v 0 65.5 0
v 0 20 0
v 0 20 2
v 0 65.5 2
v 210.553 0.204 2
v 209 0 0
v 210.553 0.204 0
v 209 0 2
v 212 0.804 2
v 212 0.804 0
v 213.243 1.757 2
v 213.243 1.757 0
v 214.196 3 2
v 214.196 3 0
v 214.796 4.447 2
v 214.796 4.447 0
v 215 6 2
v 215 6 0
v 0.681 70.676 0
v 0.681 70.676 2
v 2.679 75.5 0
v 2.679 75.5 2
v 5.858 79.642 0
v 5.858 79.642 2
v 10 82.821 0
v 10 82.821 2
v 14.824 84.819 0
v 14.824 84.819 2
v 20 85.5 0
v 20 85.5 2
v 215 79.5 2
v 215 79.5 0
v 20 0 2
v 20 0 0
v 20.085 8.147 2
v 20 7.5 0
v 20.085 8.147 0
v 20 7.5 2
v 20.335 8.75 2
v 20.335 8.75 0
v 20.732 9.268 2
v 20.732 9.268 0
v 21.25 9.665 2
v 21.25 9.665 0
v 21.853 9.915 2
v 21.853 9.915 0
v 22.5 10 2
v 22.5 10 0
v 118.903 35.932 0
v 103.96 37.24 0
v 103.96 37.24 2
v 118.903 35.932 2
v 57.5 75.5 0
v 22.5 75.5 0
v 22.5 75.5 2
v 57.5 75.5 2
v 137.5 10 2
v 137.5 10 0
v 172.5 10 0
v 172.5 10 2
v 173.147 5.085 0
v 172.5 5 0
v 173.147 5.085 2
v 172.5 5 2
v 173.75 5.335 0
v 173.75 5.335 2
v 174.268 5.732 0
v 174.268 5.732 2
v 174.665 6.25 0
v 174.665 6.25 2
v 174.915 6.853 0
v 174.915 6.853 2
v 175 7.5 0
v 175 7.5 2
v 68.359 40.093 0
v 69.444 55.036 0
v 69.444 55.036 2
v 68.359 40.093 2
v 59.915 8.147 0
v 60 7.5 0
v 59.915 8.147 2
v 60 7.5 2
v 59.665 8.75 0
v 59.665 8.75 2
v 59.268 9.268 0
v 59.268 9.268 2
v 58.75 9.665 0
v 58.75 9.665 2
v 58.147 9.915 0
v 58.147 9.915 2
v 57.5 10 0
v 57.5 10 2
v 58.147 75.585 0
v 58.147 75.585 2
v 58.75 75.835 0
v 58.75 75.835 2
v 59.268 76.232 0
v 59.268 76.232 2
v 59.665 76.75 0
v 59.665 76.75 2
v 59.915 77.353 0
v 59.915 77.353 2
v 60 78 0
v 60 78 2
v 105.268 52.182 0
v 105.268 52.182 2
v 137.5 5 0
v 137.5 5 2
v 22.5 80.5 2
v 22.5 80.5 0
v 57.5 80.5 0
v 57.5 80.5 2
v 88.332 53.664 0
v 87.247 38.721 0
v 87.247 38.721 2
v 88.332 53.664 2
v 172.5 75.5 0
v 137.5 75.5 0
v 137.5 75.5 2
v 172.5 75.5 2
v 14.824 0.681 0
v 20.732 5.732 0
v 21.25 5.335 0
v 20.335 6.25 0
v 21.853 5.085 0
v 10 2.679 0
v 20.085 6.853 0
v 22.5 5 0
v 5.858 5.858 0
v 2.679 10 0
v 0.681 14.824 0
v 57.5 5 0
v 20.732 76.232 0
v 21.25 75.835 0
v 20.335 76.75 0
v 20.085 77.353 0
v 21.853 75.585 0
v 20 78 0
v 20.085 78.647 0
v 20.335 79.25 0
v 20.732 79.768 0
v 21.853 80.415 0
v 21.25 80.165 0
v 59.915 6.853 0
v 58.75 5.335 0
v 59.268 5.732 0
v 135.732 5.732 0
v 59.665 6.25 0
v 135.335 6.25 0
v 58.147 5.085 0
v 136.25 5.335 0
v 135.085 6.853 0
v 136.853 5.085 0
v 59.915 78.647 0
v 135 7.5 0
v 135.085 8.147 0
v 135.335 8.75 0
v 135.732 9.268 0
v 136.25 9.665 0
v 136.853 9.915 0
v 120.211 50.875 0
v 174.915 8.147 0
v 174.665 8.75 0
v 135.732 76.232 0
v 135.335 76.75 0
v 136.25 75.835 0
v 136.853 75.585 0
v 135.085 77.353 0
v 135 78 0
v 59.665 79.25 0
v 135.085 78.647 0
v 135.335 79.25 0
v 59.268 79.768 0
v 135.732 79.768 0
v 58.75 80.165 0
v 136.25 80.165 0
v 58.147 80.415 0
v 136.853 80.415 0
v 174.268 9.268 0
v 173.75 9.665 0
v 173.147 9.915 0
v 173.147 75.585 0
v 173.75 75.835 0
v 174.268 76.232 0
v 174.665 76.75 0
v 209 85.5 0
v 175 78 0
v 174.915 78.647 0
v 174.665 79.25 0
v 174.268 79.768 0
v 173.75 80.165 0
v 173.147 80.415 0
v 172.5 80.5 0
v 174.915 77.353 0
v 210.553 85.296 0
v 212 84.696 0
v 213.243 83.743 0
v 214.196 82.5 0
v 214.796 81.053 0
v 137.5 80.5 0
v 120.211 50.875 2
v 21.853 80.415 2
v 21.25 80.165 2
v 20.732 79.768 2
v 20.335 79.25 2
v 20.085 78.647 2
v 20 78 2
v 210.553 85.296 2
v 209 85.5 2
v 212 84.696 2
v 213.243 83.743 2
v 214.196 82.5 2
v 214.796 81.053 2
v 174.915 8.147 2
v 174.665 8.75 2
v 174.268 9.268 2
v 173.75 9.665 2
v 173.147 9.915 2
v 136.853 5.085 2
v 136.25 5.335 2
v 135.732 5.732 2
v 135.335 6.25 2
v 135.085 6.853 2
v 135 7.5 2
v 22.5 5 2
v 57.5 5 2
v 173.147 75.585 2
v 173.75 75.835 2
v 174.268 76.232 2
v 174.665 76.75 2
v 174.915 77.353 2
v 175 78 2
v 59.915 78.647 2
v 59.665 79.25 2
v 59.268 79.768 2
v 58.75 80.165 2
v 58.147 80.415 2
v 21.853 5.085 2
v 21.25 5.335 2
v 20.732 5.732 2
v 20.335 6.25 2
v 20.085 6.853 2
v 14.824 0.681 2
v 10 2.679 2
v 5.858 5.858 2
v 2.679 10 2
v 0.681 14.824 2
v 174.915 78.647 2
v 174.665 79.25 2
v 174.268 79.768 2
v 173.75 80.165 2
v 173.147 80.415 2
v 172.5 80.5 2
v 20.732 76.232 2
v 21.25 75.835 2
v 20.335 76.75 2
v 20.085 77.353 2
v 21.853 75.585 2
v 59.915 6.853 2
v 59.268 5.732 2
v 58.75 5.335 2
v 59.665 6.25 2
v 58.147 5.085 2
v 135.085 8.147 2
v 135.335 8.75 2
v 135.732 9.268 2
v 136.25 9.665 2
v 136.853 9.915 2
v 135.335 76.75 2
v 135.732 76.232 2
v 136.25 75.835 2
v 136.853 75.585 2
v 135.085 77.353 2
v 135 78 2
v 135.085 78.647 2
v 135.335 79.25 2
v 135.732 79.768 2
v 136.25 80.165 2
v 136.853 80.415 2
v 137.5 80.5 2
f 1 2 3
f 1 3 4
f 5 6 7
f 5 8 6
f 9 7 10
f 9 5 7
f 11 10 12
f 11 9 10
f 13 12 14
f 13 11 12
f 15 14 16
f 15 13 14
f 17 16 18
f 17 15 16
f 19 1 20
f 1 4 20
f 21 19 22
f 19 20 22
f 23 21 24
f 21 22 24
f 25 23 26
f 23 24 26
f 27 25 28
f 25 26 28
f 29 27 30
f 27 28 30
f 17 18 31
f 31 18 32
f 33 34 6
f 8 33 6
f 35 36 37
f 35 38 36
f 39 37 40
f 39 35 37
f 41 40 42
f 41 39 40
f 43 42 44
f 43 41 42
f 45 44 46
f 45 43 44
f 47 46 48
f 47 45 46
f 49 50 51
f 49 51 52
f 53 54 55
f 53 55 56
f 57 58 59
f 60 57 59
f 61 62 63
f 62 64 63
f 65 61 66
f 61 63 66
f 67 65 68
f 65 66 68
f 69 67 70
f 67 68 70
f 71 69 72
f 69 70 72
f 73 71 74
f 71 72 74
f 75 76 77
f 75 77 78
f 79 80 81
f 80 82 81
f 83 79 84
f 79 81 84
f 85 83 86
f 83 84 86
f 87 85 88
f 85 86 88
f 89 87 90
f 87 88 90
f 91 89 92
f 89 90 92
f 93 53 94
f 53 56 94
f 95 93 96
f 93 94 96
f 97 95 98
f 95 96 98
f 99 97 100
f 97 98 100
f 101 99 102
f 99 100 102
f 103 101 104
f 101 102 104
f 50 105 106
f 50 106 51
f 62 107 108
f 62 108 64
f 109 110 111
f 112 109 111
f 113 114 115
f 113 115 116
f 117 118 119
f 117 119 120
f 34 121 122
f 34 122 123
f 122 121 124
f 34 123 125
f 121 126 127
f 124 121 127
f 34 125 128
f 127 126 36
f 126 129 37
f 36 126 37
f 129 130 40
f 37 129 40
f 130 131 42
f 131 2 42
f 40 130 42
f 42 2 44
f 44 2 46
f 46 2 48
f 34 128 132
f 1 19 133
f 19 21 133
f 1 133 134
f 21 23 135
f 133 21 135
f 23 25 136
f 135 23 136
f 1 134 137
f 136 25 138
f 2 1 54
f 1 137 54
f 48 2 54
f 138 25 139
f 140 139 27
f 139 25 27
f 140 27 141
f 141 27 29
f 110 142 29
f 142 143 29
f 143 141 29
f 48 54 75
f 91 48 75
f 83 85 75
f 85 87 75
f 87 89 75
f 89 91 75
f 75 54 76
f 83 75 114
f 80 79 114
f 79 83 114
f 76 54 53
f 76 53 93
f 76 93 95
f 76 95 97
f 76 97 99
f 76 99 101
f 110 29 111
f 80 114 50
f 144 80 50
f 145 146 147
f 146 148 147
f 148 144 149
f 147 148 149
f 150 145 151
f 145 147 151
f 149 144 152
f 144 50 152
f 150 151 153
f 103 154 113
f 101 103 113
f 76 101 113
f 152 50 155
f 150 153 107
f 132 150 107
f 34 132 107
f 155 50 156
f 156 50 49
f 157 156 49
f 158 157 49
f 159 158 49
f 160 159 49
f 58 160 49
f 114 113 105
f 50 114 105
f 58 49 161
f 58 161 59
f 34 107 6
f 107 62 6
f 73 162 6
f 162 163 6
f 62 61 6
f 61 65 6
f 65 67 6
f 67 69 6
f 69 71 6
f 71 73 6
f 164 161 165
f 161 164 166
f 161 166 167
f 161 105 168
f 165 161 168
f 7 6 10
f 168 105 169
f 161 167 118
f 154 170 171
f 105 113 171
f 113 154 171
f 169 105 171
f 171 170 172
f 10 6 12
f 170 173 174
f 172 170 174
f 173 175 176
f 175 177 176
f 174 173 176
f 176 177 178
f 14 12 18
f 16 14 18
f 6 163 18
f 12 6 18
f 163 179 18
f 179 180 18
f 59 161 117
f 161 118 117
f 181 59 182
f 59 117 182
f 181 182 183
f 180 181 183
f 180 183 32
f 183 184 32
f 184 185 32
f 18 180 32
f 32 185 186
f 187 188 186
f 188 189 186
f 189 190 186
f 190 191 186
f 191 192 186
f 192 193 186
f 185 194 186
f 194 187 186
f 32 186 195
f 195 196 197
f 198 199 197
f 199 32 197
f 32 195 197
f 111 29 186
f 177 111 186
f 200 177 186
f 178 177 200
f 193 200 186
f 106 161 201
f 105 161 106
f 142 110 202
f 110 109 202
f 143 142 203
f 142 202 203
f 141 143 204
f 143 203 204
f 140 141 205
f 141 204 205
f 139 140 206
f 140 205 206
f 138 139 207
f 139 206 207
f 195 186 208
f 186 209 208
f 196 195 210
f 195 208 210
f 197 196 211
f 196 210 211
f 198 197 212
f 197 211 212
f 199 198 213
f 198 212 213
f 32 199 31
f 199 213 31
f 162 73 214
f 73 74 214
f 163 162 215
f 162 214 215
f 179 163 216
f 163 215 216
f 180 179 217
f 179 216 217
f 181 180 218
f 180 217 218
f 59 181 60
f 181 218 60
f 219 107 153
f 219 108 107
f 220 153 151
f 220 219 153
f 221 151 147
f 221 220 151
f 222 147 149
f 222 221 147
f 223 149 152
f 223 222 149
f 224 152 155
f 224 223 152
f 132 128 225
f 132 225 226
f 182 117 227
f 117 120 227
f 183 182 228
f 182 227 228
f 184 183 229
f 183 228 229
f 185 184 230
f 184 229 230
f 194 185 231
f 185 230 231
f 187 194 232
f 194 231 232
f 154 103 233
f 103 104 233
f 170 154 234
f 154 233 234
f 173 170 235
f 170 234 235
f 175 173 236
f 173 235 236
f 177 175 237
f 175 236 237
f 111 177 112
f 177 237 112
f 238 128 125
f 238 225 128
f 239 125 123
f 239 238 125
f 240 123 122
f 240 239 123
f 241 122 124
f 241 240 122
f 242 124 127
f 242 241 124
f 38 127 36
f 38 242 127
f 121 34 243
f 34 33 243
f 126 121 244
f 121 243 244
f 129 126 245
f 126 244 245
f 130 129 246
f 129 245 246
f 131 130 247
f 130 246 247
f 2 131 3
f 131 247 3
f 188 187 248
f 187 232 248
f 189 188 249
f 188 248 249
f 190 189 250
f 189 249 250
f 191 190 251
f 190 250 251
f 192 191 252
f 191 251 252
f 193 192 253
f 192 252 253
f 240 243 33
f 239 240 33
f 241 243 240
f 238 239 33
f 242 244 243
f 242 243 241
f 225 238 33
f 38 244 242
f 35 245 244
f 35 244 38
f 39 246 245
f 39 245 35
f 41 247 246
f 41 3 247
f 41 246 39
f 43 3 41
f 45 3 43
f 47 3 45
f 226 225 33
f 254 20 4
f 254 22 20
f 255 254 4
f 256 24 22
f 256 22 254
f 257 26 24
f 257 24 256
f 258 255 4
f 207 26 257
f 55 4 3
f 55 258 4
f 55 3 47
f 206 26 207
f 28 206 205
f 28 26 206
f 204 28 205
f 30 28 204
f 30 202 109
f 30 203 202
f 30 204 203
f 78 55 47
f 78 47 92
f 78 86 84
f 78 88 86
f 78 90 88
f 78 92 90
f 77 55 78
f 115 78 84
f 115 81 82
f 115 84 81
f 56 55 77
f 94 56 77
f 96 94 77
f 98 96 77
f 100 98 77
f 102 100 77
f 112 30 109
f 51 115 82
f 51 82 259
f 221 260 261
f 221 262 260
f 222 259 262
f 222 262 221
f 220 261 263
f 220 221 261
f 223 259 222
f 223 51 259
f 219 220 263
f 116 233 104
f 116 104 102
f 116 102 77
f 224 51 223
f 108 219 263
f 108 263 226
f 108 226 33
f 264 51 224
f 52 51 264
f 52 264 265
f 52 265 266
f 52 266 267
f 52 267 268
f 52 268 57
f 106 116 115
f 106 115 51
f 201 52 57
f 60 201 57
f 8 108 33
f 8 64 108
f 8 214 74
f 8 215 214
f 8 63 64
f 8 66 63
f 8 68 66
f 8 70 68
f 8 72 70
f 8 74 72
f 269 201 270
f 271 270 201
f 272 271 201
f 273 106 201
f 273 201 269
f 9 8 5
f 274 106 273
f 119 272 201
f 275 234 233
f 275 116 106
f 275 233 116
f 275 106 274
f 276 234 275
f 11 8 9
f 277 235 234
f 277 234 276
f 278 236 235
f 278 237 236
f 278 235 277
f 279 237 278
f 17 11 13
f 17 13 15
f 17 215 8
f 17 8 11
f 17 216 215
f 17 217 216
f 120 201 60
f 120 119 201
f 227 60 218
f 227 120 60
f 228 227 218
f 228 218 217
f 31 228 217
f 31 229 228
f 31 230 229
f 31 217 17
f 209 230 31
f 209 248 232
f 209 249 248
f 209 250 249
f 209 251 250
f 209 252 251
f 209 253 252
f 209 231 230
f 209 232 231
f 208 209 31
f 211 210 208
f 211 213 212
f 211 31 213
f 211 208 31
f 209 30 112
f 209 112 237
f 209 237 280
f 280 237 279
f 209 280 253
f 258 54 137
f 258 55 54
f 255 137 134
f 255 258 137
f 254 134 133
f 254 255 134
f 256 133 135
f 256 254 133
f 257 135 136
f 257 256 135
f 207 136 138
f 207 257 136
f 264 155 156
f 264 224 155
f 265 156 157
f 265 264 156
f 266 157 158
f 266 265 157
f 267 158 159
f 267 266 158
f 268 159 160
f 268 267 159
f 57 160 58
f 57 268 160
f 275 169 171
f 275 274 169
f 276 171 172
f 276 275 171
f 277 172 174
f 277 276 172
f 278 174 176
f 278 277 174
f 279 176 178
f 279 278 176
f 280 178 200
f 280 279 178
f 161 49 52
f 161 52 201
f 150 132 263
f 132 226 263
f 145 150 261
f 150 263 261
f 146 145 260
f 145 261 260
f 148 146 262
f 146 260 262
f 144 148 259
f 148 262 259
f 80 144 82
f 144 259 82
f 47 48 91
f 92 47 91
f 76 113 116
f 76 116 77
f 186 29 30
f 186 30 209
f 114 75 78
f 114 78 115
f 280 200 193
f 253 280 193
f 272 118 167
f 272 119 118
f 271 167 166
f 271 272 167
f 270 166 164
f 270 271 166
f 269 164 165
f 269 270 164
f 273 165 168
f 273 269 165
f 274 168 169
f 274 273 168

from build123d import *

# Parameters (mm, degrees)
ESQUISSE1_W             = 215
ESQUISSE1_H             = 85.5
ESQUISSE1_W_2           = 40
ESQUISSE1_H_2           = 5
BOSS_EXTRU_1_DEPTH      = 2
CONG_1_R                = 6
CONG_2_R                = 20
CONG_3_R                = 2.5
ENL_V_MAT_EXTRU_1_REACH = 233.386


with BuildPart() as part:
    # Esquisse1 → Boss.-Extru.1 (new body)
    with BuildSketch(Plane.XY):
        with Locations((107.5, 42.75)):
            Rectangle(ESQUISSE1_W, ESQUISSE1_H)
        with Locations((155, 7.5)):
            Rectangle(ESQUISSE1_W_2, ESQUISSE1_H_2, mode=Mode.SUBTRACT)
        with Locations((155, 78)):
            Rectangle(ESQUISSE1_W_2, ESQUISSE1_H_2, mode=Mode.SUBTRACT)
        with Locations((40, 7.5)):
            Rectangle(ESQUISSE1_W_2, ESQUISSE1_H_2, mode=Mode.SUBTRACT)
        with Locations((40, 78)):
            Rectangle(ESQUISSE1_W_2, ESQUISSE1_H_2, mode=Mode.SUBTRACT)
    extrude(amount=BOSS_EXTRU_1_DEPTH)

    # Congé1
    cong_1_edges = [part.edges().sort_by_distance(p)[0] for p in [
        (215, 85.5, 1),
        (215, 0, 1),
    ]]
    fillet(cong_1_edges, radius=CONG_1_R)

    # Congé2
    cong_2_edges = [part.edges().sort_by_distance(p)[0] for p in [
        (0, 85.5, 1),
        (0, 0, 1),
    ]]
    fillet(cong_2_edges, radius=CONG_2_R)

    # Congé3
    cong_3_edges = [part.edges().sort_by_distance(p)[0] for p in [
        (20, 80.5, 1),
        (20, 75.5, 1),
        (60, 75.5, 1),
        (60, 80.5, 1),
        (60, 10, 1),
        (60, 5, 1),
        (20, 5, 1),
        (20, 10, 1),
        (135, 10, 1),
        (135, 5, 1),
        (175, 10, 1),
        (175, 5, 1),
        (135, 80.5, 1),
        (135, 75.5, 1),
        (175, 75.5, 1),
        (175, 80.5, 1),
    ]]
    fillet(cong_3_edges, radius=CONG_3_R - 0.0001)  # a hair under: the kernel refuses the full size

    # Esquisse2 → Enlèv. mat.-Extru.1 (cut, up to next)
    with BuildSketch(Plane(origin=(0, 0, 0), x_dir=(-1, 0, 0), z_dir=(0, 0, -1)), mode=Mode.PRIVATE) as enl_v_mat_extru_1_sk1:
        Polygon((-87.246997481, 38.721191603), (-88.332391174, 53.664112074), (-69.444138278, 55.03607886), (-68.358744585, 40.093158389), align=None)
    enl_v_mat_extru_1_tool1 = extrude(enl_v_mat_extru_1_sk1.sketch, amount=-ENL_V_MAT_EXTRU_1_REACH, mode=Mode.PRIVATE) & part.part
    # Esquisse2 → Enlèv. mat.-Extru.1 (cut, up to next)
    with BuildSketch(Plane(origin=(0, 0, 0), x_dir=(-1, 0, 0), z_dir=(0, 0, -1)), mode=Mode.PRIVATE) as enl_v_mat_extru_1_sk2:
        Polygon((-118.903285372, 35.932207835), (-120.210621513, 50.875128306), (-105.267701042, 52.182464448), (-103.9603649, 37.239543976), align=None)
    enl_v_mat_extru_1_tool2 = extrude(enl_v_mat_extru_1_sk2.sketch, amount=-ENL_V_MAT_EXTRU_1_REACH, mode=Mode.PRIVATE) & part.part
    add(enl_v_mat_extru_1_tool1.solids().sort_by_distance((78.345568, 46.878635, 0))[0], mode=Mode.SUBTRACT)
    add(enl_v_mat_extru_1_tool2.solids().sort_by_distance((112.085493, 44.057336, 0))[0], mode=Mode.SUBTRACT)


solid = part.part
